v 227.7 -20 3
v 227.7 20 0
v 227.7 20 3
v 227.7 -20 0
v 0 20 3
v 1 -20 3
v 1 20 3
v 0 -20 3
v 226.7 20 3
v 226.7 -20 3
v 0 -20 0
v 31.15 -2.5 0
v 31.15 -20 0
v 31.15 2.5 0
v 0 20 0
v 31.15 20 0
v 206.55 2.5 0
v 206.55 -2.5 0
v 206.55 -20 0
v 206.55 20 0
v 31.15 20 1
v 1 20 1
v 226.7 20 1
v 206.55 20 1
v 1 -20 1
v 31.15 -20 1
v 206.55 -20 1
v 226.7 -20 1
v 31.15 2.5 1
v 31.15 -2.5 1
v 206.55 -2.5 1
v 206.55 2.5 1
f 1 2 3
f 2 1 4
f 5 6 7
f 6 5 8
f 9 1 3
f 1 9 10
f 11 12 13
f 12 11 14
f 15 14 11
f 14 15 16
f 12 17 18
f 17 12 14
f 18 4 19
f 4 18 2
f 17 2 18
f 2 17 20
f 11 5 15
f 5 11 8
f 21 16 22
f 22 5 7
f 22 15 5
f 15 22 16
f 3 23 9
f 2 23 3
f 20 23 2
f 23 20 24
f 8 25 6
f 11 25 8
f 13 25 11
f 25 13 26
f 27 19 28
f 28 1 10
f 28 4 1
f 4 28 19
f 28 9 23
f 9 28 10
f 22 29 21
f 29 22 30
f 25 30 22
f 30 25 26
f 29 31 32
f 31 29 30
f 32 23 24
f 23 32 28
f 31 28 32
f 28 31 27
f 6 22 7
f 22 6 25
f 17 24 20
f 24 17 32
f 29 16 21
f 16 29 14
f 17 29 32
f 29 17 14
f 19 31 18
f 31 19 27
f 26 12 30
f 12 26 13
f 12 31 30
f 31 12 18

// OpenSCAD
H=228 - 0.3;
W = 60;
WC=40;
T = 1;
HX=175+0.4;
WX1=31.5;
WX2=5;

module partA() {
    difference() {
        cube([H,W,T+2]);
        translate([1,1,T])
        cube([H-2,W,T+3]);
        
        translate([-15,15,T])
        cube([H+30,W,T+3]);
        
        translate([15,-15,T])
        cube([H-30,W+30,T+3]);
        
        translate([H/2-HX/2+(14-4)/2,WX1,0])
        cube([HX,W,T]);
    }
}

module partB() {
    mirror([0,1,0])
    partA();
}

module partC() {
    difference() {
        translate([0,-WC/2,0])
        cube([H,WC,T+2]);
        
        translate([0,-WC/2,0])
        translate([1,0,T])
        cube([H-2,WC,T+3]);
        
        translate([H/2-HX/2+(14-4)/2,WX2/2,0])
        cube([HX,W,T]);
        
        mirror([0,1,0]) 
        translate([H/2-HX/2+(14-4)/2,WX2/2,0])
        cube([HX,W,T]);
    }
}

/*
partA();
translate([0,-3,0])
partB();
*/
partC();
